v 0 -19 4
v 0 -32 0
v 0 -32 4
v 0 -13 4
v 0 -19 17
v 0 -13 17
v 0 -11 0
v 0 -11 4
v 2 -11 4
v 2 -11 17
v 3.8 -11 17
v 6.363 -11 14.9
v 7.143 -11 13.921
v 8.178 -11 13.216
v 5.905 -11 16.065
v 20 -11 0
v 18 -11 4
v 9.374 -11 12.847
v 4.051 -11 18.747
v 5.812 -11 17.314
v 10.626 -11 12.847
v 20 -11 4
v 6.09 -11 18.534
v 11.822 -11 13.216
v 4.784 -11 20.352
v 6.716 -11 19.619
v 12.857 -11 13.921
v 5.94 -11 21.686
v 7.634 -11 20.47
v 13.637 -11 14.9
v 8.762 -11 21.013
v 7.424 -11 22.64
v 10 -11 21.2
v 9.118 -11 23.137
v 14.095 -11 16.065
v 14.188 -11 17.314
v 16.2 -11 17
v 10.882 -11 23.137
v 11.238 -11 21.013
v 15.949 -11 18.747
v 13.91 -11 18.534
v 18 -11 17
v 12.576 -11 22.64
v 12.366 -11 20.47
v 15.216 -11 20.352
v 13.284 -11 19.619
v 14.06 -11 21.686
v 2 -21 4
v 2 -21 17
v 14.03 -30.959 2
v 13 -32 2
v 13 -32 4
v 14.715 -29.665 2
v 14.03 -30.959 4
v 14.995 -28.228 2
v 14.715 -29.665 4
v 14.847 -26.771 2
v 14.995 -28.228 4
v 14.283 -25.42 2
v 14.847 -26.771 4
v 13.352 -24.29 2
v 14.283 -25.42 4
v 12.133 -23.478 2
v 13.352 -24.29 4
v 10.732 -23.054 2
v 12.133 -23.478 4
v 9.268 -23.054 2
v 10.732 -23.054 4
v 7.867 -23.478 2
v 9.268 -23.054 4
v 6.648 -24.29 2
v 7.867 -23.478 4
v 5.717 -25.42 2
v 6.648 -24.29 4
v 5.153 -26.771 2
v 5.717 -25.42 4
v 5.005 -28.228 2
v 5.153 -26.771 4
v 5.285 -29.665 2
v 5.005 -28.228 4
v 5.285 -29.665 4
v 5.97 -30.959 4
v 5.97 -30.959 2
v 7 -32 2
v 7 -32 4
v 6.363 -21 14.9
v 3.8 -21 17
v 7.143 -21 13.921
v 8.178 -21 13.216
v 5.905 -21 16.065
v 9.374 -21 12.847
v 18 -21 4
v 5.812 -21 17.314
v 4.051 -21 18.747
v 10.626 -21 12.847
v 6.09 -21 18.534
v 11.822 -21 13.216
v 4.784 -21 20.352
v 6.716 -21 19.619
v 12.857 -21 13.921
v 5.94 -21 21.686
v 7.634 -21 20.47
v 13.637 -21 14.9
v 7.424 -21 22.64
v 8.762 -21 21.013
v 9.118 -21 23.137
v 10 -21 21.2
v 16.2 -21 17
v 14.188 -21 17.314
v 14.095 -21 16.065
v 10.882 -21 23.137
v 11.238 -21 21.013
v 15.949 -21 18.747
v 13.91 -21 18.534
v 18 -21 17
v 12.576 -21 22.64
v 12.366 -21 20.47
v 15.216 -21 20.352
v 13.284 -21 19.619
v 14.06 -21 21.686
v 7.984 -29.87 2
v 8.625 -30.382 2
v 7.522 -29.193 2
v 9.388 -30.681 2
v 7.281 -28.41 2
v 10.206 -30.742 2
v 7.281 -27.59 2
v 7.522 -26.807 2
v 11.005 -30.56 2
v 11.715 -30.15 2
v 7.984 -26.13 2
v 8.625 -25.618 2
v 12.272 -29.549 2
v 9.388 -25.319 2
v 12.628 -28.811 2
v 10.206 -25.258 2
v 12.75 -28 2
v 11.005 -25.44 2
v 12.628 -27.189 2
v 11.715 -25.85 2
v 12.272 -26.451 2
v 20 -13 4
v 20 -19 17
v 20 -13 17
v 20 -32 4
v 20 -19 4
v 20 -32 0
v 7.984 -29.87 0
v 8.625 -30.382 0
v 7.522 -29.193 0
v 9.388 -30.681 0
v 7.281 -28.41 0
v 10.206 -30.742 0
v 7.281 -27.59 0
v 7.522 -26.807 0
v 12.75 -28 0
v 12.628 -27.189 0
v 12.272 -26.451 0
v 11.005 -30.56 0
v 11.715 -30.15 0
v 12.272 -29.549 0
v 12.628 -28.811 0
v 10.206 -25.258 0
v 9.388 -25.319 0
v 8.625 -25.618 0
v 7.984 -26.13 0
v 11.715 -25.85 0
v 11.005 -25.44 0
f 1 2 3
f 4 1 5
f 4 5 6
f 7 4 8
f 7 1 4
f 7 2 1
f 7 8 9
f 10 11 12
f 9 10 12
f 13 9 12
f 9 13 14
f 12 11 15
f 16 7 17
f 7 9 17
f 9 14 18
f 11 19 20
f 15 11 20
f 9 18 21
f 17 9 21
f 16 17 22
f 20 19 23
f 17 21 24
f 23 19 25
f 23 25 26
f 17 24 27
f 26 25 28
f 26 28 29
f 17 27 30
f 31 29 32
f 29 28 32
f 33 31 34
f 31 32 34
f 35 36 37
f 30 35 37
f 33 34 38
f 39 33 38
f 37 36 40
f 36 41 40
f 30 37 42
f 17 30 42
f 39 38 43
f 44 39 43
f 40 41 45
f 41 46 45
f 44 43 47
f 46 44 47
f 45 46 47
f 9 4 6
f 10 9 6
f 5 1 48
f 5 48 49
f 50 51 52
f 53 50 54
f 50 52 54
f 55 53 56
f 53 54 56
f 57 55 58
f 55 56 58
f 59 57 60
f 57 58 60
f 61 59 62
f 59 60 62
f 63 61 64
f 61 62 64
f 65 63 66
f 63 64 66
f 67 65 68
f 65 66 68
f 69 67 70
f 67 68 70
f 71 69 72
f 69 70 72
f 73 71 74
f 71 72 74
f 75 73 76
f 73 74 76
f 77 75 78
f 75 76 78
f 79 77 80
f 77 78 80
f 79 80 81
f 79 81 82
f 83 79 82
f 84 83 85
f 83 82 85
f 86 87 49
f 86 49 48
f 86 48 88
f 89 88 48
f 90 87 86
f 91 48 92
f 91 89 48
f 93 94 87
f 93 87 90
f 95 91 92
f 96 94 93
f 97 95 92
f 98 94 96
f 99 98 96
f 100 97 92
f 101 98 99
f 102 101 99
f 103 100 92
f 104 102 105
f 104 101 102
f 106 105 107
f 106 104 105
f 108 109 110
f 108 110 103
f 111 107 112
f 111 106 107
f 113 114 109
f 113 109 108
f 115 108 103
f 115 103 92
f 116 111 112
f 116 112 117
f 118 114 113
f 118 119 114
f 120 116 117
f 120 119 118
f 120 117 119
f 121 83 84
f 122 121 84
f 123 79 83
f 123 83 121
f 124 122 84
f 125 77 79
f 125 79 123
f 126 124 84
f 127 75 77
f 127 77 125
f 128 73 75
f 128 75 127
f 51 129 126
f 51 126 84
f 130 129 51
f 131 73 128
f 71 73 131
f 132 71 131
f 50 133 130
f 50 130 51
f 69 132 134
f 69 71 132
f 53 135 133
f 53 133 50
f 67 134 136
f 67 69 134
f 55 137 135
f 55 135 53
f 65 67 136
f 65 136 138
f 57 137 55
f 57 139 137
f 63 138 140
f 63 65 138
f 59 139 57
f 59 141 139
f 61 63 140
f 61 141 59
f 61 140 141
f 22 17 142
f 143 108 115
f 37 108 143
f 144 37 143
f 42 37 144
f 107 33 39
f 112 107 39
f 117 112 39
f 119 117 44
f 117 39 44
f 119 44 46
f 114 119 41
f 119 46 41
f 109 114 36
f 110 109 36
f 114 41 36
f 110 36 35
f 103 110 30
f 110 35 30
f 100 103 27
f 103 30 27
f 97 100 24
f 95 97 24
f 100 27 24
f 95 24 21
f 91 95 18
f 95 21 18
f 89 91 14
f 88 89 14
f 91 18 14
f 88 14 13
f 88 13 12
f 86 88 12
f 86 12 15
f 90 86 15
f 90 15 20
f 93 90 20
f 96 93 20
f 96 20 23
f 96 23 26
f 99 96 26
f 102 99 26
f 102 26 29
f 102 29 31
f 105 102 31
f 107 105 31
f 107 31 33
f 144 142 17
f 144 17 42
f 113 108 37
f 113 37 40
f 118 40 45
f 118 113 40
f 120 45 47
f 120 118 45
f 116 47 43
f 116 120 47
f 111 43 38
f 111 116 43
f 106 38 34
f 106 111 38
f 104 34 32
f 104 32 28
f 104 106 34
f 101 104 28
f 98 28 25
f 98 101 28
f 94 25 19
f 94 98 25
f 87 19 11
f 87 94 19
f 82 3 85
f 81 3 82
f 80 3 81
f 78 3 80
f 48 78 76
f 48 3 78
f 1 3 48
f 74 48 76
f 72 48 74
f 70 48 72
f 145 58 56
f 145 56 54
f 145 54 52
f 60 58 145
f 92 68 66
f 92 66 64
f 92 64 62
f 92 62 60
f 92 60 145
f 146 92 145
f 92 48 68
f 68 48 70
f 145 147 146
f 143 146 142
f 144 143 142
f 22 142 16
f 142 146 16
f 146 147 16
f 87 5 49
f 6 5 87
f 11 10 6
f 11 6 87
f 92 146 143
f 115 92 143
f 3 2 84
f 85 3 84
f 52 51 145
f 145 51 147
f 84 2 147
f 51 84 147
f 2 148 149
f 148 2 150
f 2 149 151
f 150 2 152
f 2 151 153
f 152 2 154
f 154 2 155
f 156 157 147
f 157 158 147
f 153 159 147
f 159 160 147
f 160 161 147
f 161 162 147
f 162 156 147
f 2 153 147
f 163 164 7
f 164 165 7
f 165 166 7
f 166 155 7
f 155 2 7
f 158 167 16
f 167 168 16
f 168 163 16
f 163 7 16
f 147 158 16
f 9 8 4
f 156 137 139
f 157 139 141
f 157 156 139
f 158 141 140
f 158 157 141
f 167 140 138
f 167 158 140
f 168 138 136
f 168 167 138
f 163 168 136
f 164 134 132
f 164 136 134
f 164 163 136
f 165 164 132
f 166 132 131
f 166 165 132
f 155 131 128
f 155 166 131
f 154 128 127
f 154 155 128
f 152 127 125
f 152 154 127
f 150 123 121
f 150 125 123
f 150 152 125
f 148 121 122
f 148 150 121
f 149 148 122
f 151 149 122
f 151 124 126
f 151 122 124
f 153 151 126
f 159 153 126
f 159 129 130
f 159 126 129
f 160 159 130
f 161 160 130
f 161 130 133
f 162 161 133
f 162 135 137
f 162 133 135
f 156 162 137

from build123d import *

# Parameters (mm, degrees)
SKETCH_1_W          = 20
SKETCH_1_H          = 32
SKETCH_1_R          = 2.75
EXTRUDE_1_DEPTH     = 4
SKETCH_2_W          = 20
SKETCH_2_H          = 10
EXTRUDE_2_DEPTH     = 13
SKETCH_4_R          = 6.2
EXTRUDE_3_DEPTH     = 10
SKETCH_5_R          = 4.2
CUT_EXTRUDE_1_DEPTH = 13
CHAMFER_1_SIZE      = 2
SKETCH_6_R          = 5
CUT_EXTRUDE_2_DEPTH = 2
SKETCH_7_W          = 20
SKETCH_7_H          = 11
CUT_EXTRUDE_3_DEPTH = 43.339579592


with BuildPart() as part:
    # 草图1 → 凸台-拉伸1 (new body)
    with BuildSketch(Plane.XY):
        with Locations((10, -16)):
            Rectangle(SKETCH_1_W, SKETCH_1_H)
        with Locations((10, -4)):
            Circle(SKETCH_1_R, mode=Mode.SUBTRACT)
        with Locations((10, -28)):
            Circle(SKETCH_1_R, mode=Mode.SUBTRACT)
    extrude(amount=EXTRUDE_1_DEPTH)

    # 草图2 → 凸台-拉伸2 (add)
    with BuildSketch(Plane.XY.offset(4)):
        with Locations((10, -16)):
            Rectangle(SKETCH_2_W, SKETCH_2_H)
    extrude(amount=EXTRUDE_2_DEPTH)

    # 草图4 → 凸台-拉伸3 (add)
    with BuildSketch(Plane.XZ.offset(21)):
        with Locations((10, 17)):
            Circle(SKETCH_4_R)
    extrude(amount=-EXTRUDE_3_DEPTH)

    # 草图5 → 切除-拉伸1 (cut)
    with BuildSketch(Plane(origin=(0, -11, 0), x_dir=(1, 0, 0), z_dir=(0, 1, 0))):
        with Locations(Location((10, -17, 0), (0, 0, 270))):
            Circle(SKETCH_5_R)
    extrude(amount=-CUT_EXTRUDE_1_DEPTH, mode=Mode.SUBTRACT)

    # 倒角1
    chamfer_1_edges = [part.edges().sort_by_distance(p)[0] for p in [
        (0, -11, 10.5),
        (0, -21, 10.5),
        (20, -21, 10.5),
        (20, -11, 10.5),
    ]]
    chamfer(chamfer_1_edges, length=CHAMFER_1_SIZE)

    # 草图6 → 切除-拉伸2 (cut)
    with BuildSketch(Plane.XY.offset(4)):
        with Locations((10, -28)):
            Circle(SKETCH_6_R)
        with Locations((10, -4)):
            Circle(SKETCH_6_R)
    extrude(amount=-CUT_EXTRUDE_2_DEPTH, mode=Mode.SUBTRACT)

    # 草图7 → 切除-拉伸3 (cut, through all)
    with BuildSketch(Plane.XY.offset(4)):
        with Locations((10, -5.5)):
            Rectangle(SKETCH_7_W, SKETCH_7_H)
    extrude(amount=-CUT_EXTRUDE_3_DEPTH, mode=Mode.SUBTRACT)


solid = part.part
